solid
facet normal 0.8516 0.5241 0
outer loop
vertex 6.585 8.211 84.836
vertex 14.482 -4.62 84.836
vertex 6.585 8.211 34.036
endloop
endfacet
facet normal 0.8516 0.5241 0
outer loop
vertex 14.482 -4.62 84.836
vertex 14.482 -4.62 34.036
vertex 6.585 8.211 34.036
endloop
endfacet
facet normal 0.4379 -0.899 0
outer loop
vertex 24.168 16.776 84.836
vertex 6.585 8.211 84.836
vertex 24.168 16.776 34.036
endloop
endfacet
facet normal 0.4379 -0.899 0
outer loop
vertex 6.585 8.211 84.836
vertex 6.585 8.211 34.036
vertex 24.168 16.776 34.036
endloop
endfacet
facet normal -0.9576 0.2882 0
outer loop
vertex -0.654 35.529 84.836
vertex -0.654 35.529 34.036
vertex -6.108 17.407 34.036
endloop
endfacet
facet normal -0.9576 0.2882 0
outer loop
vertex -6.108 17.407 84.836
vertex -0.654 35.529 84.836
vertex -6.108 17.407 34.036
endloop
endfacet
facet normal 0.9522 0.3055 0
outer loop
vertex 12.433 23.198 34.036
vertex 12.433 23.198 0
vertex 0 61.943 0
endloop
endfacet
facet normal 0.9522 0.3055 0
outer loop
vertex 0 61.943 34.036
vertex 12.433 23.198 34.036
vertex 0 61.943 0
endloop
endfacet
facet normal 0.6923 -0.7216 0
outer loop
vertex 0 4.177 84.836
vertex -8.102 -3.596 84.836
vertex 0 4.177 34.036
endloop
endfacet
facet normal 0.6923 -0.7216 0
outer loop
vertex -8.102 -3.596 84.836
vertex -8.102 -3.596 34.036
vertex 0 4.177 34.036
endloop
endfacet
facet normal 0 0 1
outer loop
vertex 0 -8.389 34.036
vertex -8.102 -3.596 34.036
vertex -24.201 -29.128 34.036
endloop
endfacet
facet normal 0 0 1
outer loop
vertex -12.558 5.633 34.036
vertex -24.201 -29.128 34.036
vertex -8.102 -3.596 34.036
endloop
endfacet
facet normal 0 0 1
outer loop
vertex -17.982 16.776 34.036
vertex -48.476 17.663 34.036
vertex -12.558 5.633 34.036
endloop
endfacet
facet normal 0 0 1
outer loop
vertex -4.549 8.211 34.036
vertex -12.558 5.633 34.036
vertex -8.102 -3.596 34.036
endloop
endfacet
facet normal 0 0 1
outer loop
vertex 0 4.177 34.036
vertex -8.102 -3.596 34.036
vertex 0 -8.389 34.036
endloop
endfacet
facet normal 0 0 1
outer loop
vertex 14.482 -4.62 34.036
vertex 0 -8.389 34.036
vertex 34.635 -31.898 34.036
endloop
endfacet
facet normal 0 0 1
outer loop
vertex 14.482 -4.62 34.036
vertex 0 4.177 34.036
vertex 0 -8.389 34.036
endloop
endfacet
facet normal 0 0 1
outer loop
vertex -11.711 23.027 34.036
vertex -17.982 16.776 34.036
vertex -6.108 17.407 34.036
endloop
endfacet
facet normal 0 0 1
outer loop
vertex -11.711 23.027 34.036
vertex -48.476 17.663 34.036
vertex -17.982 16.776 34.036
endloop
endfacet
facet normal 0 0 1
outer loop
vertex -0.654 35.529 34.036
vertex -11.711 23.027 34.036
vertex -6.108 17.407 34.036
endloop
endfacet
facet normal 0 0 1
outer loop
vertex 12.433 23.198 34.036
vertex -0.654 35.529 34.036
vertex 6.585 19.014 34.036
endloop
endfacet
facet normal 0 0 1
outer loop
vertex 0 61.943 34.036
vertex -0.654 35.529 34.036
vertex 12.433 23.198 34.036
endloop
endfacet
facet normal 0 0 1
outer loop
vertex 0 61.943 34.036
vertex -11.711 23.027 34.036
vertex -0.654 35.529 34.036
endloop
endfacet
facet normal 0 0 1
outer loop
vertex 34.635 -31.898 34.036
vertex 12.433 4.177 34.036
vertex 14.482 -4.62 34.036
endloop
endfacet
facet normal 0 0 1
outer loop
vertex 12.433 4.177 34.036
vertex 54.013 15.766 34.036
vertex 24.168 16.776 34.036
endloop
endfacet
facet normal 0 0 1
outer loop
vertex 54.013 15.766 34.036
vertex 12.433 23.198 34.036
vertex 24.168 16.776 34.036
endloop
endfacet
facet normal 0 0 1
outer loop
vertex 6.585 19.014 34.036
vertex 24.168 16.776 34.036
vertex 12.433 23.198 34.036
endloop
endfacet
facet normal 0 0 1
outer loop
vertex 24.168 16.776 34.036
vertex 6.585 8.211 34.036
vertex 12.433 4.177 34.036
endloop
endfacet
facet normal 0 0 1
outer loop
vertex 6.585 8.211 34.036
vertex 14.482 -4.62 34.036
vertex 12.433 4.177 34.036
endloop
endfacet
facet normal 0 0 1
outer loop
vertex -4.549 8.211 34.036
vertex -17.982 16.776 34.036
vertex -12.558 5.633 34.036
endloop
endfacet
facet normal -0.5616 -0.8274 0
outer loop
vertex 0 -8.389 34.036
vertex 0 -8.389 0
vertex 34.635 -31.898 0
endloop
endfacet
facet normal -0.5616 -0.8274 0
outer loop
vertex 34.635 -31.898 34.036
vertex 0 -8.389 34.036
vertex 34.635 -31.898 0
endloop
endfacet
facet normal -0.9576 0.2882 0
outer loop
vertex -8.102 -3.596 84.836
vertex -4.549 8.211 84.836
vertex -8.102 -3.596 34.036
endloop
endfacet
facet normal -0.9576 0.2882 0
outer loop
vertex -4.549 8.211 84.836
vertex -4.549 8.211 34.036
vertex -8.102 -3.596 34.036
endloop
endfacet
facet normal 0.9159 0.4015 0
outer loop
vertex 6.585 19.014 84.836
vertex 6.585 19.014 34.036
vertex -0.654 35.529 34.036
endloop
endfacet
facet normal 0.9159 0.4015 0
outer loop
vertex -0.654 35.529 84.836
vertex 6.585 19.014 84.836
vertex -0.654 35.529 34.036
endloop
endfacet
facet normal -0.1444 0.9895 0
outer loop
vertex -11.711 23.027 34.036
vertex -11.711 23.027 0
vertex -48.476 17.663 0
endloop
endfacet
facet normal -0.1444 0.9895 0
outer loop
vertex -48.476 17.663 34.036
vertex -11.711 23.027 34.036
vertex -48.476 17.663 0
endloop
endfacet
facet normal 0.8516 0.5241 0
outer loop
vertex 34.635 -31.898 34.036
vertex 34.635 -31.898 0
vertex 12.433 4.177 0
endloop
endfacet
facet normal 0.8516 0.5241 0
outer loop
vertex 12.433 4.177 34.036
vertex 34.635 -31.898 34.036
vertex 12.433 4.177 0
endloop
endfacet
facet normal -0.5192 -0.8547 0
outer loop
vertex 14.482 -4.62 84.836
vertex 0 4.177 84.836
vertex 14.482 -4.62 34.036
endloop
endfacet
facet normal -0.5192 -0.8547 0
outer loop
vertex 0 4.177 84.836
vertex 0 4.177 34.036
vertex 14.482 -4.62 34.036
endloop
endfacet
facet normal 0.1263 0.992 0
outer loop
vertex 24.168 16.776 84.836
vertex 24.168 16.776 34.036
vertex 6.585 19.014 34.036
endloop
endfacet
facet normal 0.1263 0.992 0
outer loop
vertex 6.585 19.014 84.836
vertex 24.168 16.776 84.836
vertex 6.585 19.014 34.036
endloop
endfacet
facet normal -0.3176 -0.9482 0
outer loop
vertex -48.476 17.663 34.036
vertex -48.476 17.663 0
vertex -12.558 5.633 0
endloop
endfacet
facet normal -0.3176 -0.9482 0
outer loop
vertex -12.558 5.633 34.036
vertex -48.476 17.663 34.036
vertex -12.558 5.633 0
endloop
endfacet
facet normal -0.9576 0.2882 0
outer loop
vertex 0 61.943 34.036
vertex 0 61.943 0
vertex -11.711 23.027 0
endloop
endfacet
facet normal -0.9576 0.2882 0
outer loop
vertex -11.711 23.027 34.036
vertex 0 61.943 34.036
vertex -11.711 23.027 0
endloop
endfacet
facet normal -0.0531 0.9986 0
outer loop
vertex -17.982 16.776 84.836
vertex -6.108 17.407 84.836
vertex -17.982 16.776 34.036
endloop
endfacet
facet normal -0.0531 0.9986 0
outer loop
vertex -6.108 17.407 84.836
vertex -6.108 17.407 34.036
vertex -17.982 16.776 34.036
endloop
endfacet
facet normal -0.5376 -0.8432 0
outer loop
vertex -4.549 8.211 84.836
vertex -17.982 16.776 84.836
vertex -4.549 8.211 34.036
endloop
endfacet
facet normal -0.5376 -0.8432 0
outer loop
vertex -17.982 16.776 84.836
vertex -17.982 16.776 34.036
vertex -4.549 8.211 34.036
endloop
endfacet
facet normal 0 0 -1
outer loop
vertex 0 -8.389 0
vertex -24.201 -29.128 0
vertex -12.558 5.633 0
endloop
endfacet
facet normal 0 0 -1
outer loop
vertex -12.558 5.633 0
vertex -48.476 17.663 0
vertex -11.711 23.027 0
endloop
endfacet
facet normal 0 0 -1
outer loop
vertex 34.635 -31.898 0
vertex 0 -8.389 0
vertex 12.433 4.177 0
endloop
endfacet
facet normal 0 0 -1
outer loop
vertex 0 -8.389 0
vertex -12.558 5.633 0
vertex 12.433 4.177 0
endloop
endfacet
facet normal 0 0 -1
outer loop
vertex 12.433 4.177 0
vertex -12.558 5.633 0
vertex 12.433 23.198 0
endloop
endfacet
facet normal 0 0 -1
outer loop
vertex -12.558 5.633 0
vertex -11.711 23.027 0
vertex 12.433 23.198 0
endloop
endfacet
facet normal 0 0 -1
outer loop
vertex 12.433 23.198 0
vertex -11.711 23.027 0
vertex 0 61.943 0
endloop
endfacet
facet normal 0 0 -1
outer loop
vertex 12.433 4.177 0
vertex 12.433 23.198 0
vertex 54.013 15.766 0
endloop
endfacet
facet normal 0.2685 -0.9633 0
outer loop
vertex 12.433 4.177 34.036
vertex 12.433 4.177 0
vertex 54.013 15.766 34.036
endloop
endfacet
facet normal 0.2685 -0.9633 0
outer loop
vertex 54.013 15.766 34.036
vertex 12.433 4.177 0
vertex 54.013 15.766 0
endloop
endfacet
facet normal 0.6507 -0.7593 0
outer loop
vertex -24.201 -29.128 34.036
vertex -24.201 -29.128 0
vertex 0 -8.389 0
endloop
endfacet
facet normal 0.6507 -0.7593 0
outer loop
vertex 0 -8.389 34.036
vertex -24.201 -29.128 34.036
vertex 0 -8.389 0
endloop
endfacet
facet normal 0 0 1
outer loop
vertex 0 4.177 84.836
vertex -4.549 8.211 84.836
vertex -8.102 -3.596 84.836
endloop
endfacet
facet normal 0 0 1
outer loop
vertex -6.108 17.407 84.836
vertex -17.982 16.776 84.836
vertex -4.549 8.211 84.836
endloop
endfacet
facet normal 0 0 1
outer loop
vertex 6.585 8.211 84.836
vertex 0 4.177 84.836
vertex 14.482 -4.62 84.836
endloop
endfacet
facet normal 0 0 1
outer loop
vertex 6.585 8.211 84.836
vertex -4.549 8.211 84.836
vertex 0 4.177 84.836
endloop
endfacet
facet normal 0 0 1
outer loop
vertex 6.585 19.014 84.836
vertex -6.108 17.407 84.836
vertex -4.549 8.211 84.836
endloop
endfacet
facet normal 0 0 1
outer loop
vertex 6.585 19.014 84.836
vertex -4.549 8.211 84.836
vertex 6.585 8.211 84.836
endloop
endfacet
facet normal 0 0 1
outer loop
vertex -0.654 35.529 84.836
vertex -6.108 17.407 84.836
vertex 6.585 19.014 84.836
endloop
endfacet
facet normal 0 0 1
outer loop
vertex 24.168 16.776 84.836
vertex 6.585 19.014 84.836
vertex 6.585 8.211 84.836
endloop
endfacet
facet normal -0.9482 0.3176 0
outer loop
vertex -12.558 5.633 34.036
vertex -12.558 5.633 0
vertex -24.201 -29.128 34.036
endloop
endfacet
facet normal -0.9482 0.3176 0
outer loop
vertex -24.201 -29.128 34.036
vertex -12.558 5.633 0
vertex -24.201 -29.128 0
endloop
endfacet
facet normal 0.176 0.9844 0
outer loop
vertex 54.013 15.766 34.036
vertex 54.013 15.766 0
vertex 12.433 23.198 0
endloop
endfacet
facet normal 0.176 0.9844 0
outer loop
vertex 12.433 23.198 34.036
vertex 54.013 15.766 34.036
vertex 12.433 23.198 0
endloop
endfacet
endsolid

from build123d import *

# Parameters (mm, degrees)
F1_DEPTH = 34.036
F3_DEPTH = 25.4
F4_DEPTH = 25.4


with BuildPart() as f1:
    # F0 (on Top) → F1 (new body)
    with BuildSketch(Plane.XY):
        Polygon((0, 61.9426332414), (-11.7109799758, 23.0268388987), (-48.476384759, 17.6629981817), (-12.558279559, 5.6331055239), (-24.2008212954, -29.1284713894), (0, -8.3885807544), (34.6354208887, -31.8980328739), (12.4329142272, 4.1770320386), (54.0130585432, 15.7661139965), (12.4329142272, 23.1984425336), align=None)
    extrude(amount=F1_DEPTH)

    # F2 (on face) → F3 (join)
    with BuildSketch(Plane.XY.offset(34.036)):
        Polygon((-0.6540262179, 35.5291943997), (-6.1076348647, 17.4067560583), (-17.9816167802, 16.7758520693), (-4.5490903707, 8.2113984972), (-8.1022512168, -3.595818067), (0, 4.1770320386), (14.4822600718, -4.6202587845), (6.5849781968, 8.2113984972), (24.167701602, 16.7758520693), (6.5849781968, 19.013568759), align=None)
    extrude(amount=F3_DEPTH)

    # F4 (add): faces of the model
    f4_faces = [f1.faces().sort_by_distance(p)[0] for p in [
        (2.0638744173, 13.7880141108, 59.436),
        (2.0271315912, 10.6742348057, 0),
    ]]
    extrude(f4_faces, amount=F4_DEPTH, dir=(0, 0, 1))


solid = f1.part
